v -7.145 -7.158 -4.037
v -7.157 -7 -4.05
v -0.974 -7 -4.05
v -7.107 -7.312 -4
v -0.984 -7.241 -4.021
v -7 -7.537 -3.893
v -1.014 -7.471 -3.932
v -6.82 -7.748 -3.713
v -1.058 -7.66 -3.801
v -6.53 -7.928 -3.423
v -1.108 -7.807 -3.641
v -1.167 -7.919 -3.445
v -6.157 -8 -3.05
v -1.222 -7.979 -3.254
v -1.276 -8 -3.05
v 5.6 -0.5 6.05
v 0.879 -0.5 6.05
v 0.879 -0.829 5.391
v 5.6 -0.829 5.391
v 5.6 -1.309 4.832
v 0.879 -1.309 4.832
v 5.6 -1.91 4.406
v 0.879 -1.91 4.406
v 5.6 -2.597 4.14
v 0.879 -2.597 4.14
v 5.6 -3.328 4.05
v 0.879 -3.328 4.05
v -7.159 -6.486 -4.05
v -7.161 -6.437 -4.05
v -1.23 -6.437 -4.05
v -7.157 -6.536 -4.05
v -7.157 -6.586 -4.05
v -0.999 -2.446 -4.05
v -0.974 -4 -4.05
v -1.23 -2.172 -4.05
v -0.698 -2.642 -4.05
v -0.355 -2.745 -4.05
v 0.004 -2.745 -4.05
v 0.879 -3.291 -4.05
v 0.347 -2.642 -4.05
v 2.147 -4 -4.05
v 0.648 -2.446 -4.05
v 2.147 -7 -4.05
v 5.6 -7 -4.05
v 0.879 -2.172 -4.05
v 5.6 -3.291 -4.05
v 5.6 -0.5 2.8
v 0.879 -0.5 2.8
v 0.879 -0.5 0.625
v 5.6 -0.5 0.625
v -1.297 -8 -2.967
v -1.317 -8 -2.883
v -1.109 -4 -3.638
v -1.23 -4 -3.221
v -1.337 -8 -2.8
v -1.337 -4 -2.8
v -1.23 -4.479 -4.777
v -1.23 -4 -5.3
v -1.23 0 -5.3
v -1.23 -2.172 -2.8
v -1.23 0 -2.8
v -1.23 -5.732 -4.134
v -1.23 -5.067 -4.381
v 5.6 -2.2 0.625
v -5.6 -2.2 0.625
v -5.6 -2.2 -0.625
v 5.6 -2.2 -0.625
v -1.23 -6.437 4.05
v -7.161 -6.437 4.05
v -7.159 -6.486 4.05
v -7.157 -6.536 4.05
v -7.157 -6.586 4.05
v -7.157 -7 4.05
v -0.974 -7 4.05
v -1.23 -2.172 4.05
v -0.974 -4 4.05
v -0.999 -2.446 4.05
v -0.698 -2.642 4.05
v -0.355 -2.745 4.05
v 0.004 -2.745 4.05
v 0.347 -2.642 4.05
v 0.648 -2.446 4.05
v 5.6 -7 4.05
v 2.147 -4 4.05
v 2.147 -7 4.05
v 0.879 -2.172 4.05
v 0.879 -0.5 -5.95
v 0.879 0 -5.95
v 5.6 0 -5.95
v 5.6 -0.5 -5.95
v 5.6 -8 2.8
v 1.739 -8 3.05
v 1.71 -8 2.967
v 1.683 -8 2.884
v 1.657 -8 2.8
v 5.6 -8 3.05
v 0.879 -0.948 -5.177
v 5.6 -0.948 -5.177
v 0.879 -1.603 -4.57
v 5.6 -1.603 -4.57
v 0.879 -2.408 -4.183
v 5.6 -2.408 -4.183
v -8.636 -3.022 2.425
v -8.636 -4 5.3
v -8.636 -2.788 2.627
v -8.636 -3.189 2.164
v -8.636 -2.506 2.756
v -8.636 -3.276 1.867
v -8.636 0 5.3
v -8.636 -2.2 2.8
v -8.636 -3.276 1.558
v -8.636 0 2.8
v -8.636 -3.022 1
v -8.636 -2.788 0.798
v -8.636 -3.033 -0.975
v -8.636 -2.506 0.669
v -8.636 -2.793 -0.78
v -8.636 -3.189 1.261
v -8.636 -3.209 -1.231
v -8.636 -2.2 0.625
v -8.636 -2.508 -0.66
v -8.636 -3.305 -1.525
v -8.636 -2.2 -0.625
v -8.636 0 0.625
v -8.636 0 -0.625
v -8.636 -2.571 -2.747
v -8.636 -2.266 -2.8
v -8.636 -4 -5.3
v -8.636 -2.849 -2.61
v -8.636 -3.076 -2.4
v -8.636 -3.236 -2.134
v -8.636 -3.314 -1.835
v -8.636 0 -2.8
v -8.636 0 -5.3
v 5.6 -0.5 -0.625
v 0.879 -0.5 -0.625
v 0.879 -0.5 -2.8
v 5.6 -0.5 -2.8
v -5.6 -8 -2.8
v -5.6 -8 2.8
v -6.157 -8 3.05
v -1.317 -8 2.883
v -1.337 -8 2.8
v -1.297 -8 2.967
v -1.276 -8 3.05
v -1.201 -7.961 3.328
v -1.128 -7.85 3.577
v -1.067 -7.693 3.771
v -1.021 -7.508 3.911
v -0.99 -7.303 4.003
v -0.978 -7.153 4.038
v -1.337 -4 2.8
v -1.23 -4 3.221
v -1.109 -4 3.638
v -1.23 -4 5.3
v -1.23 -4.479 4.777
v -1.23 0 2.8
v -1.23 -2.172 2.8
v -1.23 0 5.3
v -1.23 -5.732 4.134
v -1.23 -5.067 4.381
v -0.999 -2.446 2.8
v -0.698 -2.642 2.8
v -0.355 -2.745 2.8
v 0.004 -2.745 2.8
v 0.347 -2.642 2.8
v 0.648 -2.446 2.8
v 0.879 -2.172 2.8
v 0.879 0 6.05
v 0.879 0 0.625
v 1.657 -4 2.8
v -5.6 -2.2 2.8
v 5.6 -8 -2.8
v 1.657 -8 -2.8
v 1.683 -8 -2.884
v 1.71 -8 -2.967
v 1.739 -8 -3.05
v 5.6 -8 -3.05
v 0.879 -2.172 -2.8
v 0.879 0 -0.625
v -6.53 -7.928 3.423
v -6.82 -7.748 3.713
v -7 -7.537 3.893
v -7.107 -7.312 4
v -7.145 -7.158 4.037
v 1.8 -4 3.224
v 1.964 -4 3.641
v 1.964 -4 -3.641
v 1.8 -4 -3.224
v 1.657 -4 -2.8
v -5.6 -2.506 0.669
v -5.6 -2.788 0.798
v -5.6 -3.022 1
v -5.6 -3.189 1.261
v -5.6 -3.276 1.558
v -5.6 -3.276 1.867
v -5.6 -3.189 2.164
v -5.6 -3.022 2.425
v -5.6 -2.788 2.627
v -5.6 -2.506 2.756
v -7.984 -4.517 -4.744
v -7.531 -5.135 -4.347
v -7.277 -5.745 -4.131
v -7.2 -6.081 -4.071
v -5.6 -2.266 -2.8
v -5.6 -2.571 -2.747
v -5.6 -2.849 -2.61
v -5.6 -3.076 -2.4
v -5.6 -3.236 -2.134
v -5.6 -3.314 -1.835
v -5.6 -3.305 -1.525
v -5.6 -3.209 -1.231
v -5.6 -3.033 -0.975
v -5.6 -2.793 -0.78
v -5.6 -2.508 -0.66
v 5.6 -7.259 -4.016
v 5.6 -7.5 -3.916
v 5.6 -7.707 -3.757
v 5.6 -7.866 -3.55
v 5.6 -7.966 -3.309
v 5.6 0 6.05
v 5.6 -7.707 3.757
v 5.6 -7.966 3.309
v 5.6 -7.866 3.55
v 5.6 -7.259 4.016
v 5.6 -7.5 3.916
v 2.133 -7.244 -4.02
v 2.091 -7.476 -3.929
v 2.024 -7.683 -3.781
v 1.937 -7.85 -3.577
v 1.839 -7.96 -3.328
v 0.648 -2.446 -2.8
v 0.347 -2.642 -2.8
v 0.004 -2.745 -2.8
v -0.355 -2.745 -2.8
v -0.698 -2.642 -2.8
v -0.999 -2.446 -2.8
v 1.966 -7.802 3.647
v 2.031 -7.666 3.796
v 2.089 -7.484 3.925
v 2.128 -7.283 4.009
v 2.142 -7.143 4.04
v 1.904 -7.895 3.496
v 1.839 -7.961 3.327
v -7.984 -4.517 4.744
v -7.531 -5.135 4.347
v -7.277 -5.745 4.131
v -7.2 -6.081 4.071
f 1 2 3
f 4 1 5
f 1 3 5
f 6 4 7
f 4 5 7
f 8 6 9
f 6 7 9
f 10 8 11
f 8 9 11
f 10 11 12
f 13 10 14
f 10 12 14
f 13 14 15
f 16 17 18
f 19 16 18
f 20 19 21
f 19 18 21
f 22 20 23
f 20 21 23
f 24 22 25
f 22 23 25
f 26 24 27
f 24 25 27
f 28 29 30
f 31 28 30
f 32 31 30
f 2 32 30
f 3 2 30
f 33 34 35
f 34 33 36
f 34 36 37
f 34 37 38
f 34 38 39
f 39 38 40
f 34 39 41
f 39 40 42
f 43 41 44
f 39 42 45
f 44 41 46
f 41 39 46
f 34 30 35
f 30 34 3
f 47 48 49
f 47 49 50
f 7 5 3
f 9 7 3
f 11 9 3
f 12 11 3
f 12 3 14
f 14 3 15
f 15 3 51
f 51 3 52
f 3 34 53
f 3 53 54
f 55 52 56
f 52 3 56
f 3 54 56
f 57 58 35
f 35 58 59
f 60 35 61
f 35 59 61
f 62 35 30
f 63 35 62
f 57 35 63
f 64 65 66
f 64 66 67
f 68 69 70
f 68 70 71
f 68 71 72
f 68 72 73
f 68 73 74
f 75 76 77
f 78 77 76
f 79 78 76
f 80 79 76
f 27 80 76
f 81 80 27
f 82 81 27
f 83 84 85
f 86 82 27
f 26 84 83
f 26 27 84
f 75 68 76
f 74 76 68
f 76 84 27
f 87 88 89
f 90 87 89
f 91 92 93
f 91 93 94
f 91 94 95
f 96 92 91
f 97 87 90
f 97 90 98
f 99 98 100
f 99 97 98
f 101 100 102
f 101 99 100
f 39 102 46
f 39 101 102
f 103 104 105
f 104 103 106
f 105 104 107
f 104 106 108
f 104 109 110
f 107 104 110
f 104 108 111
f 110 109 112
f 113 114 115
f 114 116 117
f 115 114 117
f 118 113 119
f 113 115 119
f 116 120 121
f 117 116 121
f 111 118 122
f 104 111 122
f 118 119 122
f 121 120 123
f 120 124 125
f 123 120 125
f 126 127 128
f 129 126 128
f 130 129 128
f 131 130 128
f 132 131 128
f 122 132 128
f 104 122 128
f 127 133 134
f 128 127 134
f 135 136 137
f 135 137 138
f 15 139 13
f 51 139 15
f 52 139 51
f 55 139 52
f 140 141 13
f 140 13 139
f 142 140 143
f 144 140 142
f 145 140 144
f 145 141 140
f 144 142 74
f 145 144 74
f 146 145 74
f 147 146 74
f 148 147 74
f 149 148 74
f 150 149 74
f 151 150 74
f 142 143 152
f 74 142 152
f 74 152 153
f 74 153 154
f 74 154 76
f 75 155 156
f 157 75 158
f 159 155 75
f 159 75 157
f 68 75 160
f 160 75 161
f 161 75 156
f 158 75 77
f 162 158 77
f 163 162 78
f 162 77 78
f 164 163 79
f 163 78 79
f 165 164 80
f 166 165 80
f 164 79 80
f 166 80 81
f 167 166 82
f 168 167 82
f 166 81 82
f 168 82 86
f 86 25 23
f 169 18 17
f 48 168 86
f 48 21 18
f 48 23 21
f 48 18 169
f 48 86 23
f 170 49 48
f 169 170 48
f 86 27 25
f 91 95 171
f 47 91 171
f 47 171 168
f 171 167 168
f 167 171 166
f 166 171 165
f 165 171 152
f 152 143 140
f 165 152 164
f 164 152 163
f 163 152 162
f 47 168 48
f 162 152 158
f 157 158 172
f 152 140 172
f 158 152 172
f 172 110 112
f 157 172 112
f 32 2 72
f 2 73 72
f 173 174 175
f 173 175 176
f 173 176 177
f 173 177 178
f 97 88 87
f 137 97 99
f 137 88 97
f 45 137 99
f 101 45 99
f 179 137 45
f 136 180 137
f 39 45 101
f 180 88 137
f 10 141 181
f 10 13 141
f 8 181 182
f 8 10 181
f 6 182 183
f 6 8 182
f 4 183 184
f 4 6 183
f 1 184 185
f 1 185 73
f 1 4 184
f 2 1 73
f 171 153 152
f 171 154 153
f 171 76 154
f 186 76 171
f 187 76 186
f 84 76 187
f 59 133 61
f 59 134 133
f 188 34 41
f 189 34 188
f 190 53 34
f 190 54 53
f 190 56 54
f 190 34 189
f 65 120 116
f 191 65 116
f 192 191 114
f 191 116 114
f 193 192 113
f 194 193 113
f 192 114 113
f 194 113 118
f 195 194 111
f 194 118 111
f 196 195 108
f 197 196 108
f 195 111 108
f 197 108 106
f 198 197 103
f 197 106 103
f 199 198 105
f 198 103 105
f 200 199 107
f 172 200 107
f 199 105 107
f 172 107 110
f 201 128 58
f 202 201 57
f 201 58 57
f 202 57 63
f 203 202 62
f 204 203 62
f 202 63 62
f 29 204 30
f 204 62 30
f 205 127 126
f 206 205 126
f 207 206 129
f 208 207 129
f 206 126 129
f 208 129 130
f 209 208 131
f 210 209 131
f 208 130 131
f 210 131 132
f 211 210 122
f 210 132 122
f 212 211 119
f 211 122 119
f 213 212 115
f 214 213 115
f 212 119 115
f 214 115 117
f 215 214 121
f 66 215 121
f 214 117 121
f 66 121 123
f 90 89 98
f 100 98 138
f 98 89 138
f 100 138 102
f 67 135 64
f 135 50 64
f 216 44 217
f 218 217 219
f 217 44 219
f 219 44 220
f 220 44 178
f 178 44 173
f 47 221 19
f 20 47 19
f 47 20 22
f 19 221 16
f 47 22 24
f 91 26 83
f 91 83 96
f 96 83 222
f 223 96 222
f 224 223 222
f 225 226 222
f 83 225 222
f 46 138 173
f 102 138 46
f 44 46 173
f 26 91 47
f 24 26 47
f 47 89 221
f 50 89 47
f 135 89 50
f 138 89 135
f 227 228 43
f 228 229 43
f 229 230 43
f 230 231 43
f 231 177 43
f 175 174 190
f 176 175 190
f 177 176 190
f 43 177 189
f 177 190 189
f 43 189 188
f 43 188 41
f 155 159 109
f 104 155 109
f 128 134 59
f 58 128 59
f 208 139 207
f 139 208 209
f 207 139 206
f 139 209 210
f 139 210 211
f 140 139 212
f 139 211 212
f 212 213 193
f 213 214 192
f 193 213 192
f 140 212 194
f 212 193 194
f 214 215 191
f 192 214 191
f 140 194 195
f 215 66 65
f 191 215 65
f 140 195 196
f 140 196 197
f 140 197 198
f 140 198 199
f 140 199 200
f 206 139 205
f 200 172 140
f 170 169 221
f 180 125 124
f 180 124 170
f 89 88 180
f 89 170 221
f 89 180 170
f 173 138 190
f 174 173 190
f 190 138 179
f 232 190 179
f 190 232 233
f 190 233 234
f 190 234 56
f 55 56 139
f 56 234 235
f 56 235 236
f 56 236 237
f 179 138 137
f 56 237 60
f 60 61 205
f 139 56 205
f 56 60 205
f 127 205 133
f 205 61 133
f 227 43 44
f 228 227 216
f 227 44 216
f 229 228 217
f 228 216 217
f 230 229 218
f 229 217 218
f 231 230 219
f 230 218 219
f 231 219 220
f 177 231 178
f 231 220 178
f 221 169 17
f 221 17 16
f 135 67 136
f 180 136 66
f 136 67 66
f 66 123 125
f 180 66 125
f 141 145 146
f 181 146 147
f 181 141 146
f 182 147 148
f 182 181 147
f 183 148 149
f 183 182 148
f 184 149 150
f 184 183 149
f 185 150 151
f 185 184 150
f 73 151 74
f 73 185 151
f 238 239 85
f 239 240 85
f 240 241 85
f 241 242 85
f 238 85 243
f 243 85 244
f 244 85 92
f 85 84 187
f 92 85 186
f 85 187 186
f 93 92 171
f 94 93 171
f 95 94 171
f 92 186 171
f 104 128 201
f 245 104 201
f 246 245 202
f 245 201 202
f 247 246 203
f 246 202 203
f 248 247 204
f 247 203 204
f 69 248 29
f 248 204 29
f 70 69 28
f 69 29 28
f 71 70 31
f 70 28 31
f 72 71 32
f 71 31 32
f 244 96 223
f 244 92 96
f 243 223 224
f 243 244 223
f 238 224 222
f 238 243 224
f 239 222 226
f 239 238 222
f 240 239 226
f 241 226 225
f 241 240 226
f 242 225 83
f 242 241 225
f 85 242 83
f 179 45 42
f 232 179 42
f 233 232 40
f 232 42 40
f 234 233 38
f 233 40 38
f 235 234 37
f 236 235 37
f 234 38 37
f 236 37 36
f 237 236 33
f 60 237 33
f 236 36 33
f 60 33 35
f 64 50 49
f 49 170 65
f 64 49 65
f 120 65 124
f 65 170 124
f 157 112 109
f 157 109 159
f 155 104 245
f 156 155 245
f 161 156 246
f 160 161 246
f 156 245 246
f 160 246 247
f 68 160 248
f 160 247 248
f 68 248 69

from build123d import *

# Parameters (mm, degrees)
F1_DEPTH      = 2.2
F2_DEPTH      = 4
F3_DEPTH      = 8
F5_W          = 4.721
F5_H          = 0.5
F6_DEPTH      = 2
F6_DEPTH_BACK = 10
F7_DEPTH      = 4
F8_T1_DEPTH   = 5.9270831351
F8_T3_DEPTH   = 8.1
F8_T5_DEPTH   = 4.721
F8_T11_DEPTH  = 12.0188296006
F8_T16_DEPTH  = 14.5648341529
F8_T24_DEPTH  = 14.5648341529
F8_T29_DEPTH  = 12.0188296006
F10_DEPTH     = 1.5
F12_DEPTH     = 2
F13_R         = 1


# Not quite as in the source:
# - a fillet or chamfer that OpenCascade refuses, or shapes differently, is made with other operations: its cross-section is extruded or revolved along the edge and cut away or added


with BuildPart() as f1:
    # F0 (on Front) → F1 (new body)
    with BuildSketch(Plane.XZ):
        with BuildLine():
            Line((-1.6440981598, 0.625), (-5.6, 0.625))
            Line((-5.6, 0.625), (-5.6, -0.625))
            Line((-5.6, -0.625), (-1.6440981598, -0.625))
            ThreePointArc((-1.6440981598, -0.625), (-1.6599999508, 0), (-1.6440981598, 0.625))
        make_face()
        with BuildLine():
            Line((-1.23, 0.625), (-1.6440981598, 0.625))
            ThreePointArc((-1.6440981598, 0.625), (-1.6599999508, 0), (-1.6440981598, -0.625))
            Line((-1.6440981598, -0.625), (-1.23, -0.625))
            Line((-1.23, -0.625), (1.2508001143, -0.625))
            ThreePointArc((1.2508001143, -0.625), (1.23, 0), (1.2508001143, 0.625))
            Line((1.2508001143, 0.625), (-1.23, 0.625))
        make_face()
        with BuildLine():
            Line((1.6420518568, 0.625), (1.2508001143, 0.625))
            ThreePointArc((1.2508001143, 0.625), (1.23, 0), (1.2508001143, -0.625))
            Line((1.2508001143, -0.625), (1.6420518568, -0.625))
            Line((1.6420518568, -0.625), (5.6, -0.625))
            Line((5.6, -0.625), (5.6, 0.625))
            Line((5.6, 0.625), (1.6420518568, 0.625))
        make_face()
    extrude(amount=F1_DEPTH)

    # F0 (on Front) → F2 (join)
    with BuildSketch(Plane.XZ):
        with BuildLine():
            Line((5.6, -2.8), (1.6566885771, -2.8))
            ThreePointArc((1.6566885771, -2.8), (1.8795878526, -3.4337692421), (2.1471830551, -4.05))
            Line((2.1471830551, -4.05), (5.6, -4.05))
            Line((5.6, -4.05), (5.6, -2.8))
        make_face()
        with BuildLine():
            Line((-1.23, -2.8), (-1.3368015602, -2.8))
            ThreePointArc((-1.3368015602, -2.8), (-1.1717307029, -3.4298126738), (-0.9735386938, -4.05))
            Line((-0.9735386938, -4.05), (0.8789681604, -4.05))
            Line((0.8789681604, -4.05), (2.1471830551, -4.05))
            ThreePointArc((2.1471830551, -4.05), (1.8795878526, -3.4337692421), (1.6566885771, -2.8))
            Line((1.6566885771, -2.8), (1.23, -2.8))
            Line((1.23, -2.8), (-1.23, -2.8))
        make_face()
        with BuildLine():
            Line((-1.735931594, -2.8), (-5.6, -2.8))
            Line((-5.6, -2.8), (-5.6, -4.05))
            Line((-5.6, -4.05), (-2.3307385194, -4.05))
            Line((-2.3307385194, -4.05), (-1.23, -4.05))
            Line((-1.23, -4.05), (-0.9735386938, -4.05))
            ThreePointArc((-0.9735386938, -4.05), (-1.1717307029, -3.4298126738), (-1.3368015602, -2.8))
            Line((-1.3368015602, -2.8), (-1.735931594, -2.8))
        make_face()
        Polygon((-7.1570831351, 4.05), (-5.6, 4.05), (-2.3307385194, 4.05), (-1.23, 4.05), (-1.23, 5.3), (-8.636245504, 5.3), (-8.636245504, -5.3), (-1.23, -5.3), (-1.23, -4.05), (-2.3307385194, -4.05), (-5.6, -4.05), (-7.1570831351, -4.05), align=None)
        Polygon((-5.6, -0.625), (-5.6, 0.625), (-5.6, 2.8), (-5.6, 4.05), (-7.1570831351, 4.05), (-7.1570831351, -4.05), (-5.6, -4.05), (-5.6, -2.8), align=None)
        with BuildLine():
            Line((-5.6, 4.05), (-5.6, 2.8))
            Line((-5.6, 2.8), (-1.735931594, 2.8))
            Line((-1.735931594, 2.8), (-1.3368015602, 2.8))
            ThreePointArc((-1.3368015602, 2.8), (-1.1717307029, 3.4298126738), (-0.9735386938, 4.05))
            Line((-0.9735386938, 4.05), (-1.23, 4.05))
            Line((-1.23, 4.05), (-2.3307385194, 4.05))
            Line((-2.3307385194, 4.05), (-5.6, 4.05))
        make_face()
        with BuildLine():
            ThreePointArc((-0.9735386938, 4.05), (-1.1717307029, 3.4298126738), (-1.3368015602, 2.8))
            Line((-1.3368015602, 2.8), (1.23, 2.8))
            Line((1.23, 2.8), (1.2939187969, 2.8))
            Line((1.2939187969, 2.8), (1.6566885771, 2.8))
            ThreePointArc((1.6566885771, 2.8), (1.8795878526, 3.4337692421), (2.1471830551, 4.05))
            Line((2.1471830551, 4.05), (0.8789681604, 4.05))
            Line((0.8789681604, 4.05), (-0.9735386938, 4.05))
        make_face()
        with BuildLine():
            ThreePointArc((2.1471830551, 4.05), (1.8795878526, 3.4337692421), (1.6566885771, 2.8))
            Line((1.6566885771, 2.8), (5.6, 2.8))
            Line((5.6, 2.8), (5.6, 4.05))
            Line((5.6, 4.05), (2.1471830551, 4.05))
        make_face()
    extrude(amount=F2_DEPTH)

    # F0 (on Front) → F3 (join)
    with BuildSketch(Plane.XZ):
        with BuildLine():
            ThreePointArc((2.1471830551, 4.05), (1.8795878526, 3.4337692421), (1.6566885771, 2.8))
            Line((1.6566885771, 2.8), (5.6, 2.8))
            Line((5.6, 2.8), (5.6, 4.05))
            Line((5.6, 4.05), (2.1471830551, 4.05))
        make_face()
        with BuildLine():
            Line((-5.6, 4.05), (-5.6, 2.8))
            Line((-5.6, 2.8), (-1.735931594, 2.8))
            Line((-1.735931594, 2.8), (-1.3368015602, 2.8))
            ThreePointArc((-1.3368015602, 2.8), (-1.1717307029, 3.4298126738), (-0.9735386938, 4.05))
            Line((-0.9735386938, 4.05), (-1.23, 4.05))
            Line((-1.23, 4.05), (-2.3307385194, 4.05))
            Line((-2.3307385194, 4.05), (-5.6, 4.05))
        make_face()
        Polygon((-5.6, -0.625), (-5.6, 0.625), (-5.6, 2.8), (-5.6, 4.05), (-7.1570831351, 4.05), (-7.1570831351, -4.05), (-5.6, -4.05), (-5.6, -2.8), align=None)
        with BuildLine():
            Line((-1.735931594, -2.8), (-5.6, -2.8))
            Line((-5.6, -2.8), (-5.6, -4.05))
            Line((-5.6, -4.05), (-2.3307385194, -4.05))
            Line((-2.3307385194, -4.05), (-1.23, -4.05))
            Line((-1.23, -4.05), (-0.9735386938, -4.05))
            ThreePointArc((-0.9735386938, -4.05), (-1.1717307029, -3.4298126738), (-1.3368015602, -2.8))
            Line((-1.3368015602, -2.8), (-1.735931594, -2.8))
        make_face()
        with BuildLine():
            Line((5.6, -2.8), (1.6566885771, -2.8))
            ThreePointArc((1.6566885771, -2.8), (1.8795878526, -3.4337692421), (2.1471830551, -4.05))
            Line((2.1471830551, -4.05), (5.6, -4.05))
            Line((5.6, -4.05), (5.6, -2.8))
        make_face()
    extrude(amount=F3_DEPTH)

    # F5 (on face) → F6 (join, two sides)
    with BuildSketch(Plane.XY.offset(4.05)) as f6_sk:
        with Locations((3.2395, -0.25)):
            Rectangle(F5_W, F5_H)
    extrude(amount=F6_DEPTH)
    extrude(f6_sk.sketch, amount=-F6_DEPTH_BACK)

    # F4 (on face) → F7 (cut)
    with BuildSketch(Plane(origin=(-8.636245504, 0, 0), x_dir=(0, -1, 0), z_dir=(-1, 0, 0))):
        with BuildLine():
            ThreePointArc((2.2, 0.625), (3.2875, 1.7125), (2.2, 2.8))
            Line((2.2, 2.8), (0, 2.8))
            Line((0, 2.8), (0, 0.625))
            Line((0, 0.625), (2.2, 0.625))
        make_face()
        with BuildLine():
            ThreePointArc((2.2659621103, -2.8), (3.3204810552, -1.6795189448), (2.2, -0.625))
            Line((2.2, -0.625), (0, -0.625))
            Line((0, -0.625), (0, -2.8))
            Line((0, -2.8), (2.2, -2.8))
            Line((2.2, -2.8), (2.2659621103, -2.8))
        make_face()
    extrude(amount=-F7_DEPTH, mode=Mode.SUBTRACT)

    # F8: fillet of radius 3 on 5 edges, made by hand

    # F8_s2 → F8_t1 (join)
    with BuildSketch(Plane.YZ.offset(-7.1570831351)):
        with BuildLine():
            ThreePointArc((-4, 5.3), (-5.0673921924, 4.380730437), (-6.4366985862, 4.05))
            Line((-6.4366985862, 4.05), (-4, 4.05))
            Line((-4, 4.05), (-4, 5.3))
        make_face()
        with BuildLine():
            ThreePointArc((-4, -5.3), (-5.0673921924, -4.380730437), (-6.4366985862, -4.05))
            Line((-6.4366985862, -4.05), (-4, -4.05))
            Line((-4, -4.05), (-4, -5.3))
        make_face()
    extrude(amount=F8_T1_DEPTH)

    # F8_s4 → F8_t3 (join)
    with BuildSketch(Plane.XY.offset(-4.05)):
        with BuildLine():
            ThreePointArc((-8.636245504, -4), (-7.5529985653, -5.0963889141), (-7.1570831351, -6.5859336612))
            Line((-7.1570831351, -6.5859336612), (-7.1570831351, -4))
            Line((-7.1570831351, -4), (-8.636245504, -4))
        make_face()
    extrude(amount=F8_T3_DEPTH)

    # F8_s6 → F8_t5 (join)
    with BuildSketch(Plane.YZ.offset(0.879)):
        with BuildLine():
            ThreePointArc((-0.5, -5.95), (-1.6028628458, -4.5700806465), (-3.2910571474, -4.05))
            Line((-3.2910571474, -4.05), (-0.5, -4.05))
            Line((-0.5, -4.05), (-0.5, -5.95))
        make_face()
        with BuildLine():
            ThreePointArc((-0.5, 6.05), (-1.5963763172, 4.6005102572), (-3.3284271247, 4.05))
            Line((-3.3284271247, 4.05), (-0.5, 4.05))
            Line((-0.5, 4.05), (-0.5, 6.05))
        make_face()
    extrude(amount=F8_T5_DEPTH)


with BuildPart() as f8_tool9:
    # F8_s10 → F8_t11 (new body)
    with BuildSketch(Plane.YZ.offset(-13.2488296006)):
        with BuildLine():
            ThreePointArc((-4, 5.3), (-5.0673921924, 4.380730437), (-6.4366985862, 4.05))
            Line((-6.4366985862, 4.05), (-4, 4.05))
            Line((-4, 4.05), (-4, 5.3))
        make_face()
    extrude(amount=F8_T11_DEPTH)

    split(bisect_by=Plane.YZ.offset(-7.1570831351), keep=Keep.BOTTOM)

    split(bisect_by=Plane.YZ.offset(-8.636245504), keep=Keep.TOP)


with BuildPart() as f8_tool14:
    # F8_s15 → F8_t16 (new body)
    with BuildSketch(Plane.XY.offset(-4.05)):
        with BuildLine():
            ThreePointArc((-8.636245504, -4), (-7.5529985653, -5.0963889141), (-7.1570831351, -6.5859336612))
            Line((-7.1570831351, -6.5859336612), (-7.1570831351, -4))
            Line((-7.1570831351, -4), (-8.636245504, -4))
        make_face()
    extrude(amount=F8_T16_DEPTH)

    split(bisect_by=Plane.XY.offset(5.3), keep=Keep.BOTTOM)

    split(bisect_by=Plane.XY.offset(4.05), keep=Keep.TOP)


with BuildPart() as f8_tool9_1:
    add(f8_tool9.part)

    # F8_t19: intersect F8_tool14
    add(f8_tool14.part, mode=Mode.INTERSECT)


with BuildPart() as f1_1:
    add(f1.part)

    # F8_t7: union F8_tool9
    add(f8_tool9_1.part)


with BuildPart() as f8_tool22:
    # F8_s23 → F8_t24 (new body)
    with BuildSketch(Plane.XY.offset(-10.5148341529)):
        with BuildLine():
            ThreePointArc((-8.636245504, -4), (-7.5529985653, -5.0963889141), (-7.1570831351, -6.5859336612))
            Line((-7.1570831351, -6.5859336612), (-7.1570831351, -4))
            Line((-7.1570831351, -4), (-8.636245504, -4))
        make_face()
    extrude(amount=F8_T24_DEPTH)

    split(bisect_by=Plane.XY.offset(-5.3), keep=Keep.TOP)

    split(bisect_by=Plane.XY.offset(-4.05), keep=Keep.BOTTOM)


with BuildPart() as f8_tool27:
    # F8_s28 → F8_t29 (new body)
    with BuildSketch(Plane.YZ.offset(-1.23)):
        with BuildLine():
            ThreePointArc((-4, -5.3), (-5.0673921924, -4.380730437), (-6.4366985862, -4.05))
            Line((-6.4366985862, -4.05), (-4, -4.05))
            Line((-4, -4.05), (-4, -5.3))
        make_face()
    extrude(amount=-F8_T29_DEPTH)

    split(bisect_by=Plane.YZ.offset(-7.1570831351), keep=Keep.BOTTOM)

    split(bisect_by=Plane.YZ.offset(-8.636245504), keep=Keep.TOP)


with BuildPart() as f8_tool22_1:
    add(f8_tool22.part)

    # F8_t32: intersect F8_tool27
    add(f8_tool27.part, mode=Mode.INTERSECT)


with BuildPart() as f1_2:
    add(f1_1.part)

    # F8_t20: union F8_tool22
    add(f8_tool22_1.part)

    # F9 (on face) → F10 (cut)
    with BuildSketch(Plane.XY.offset(4.05)):
        with BuildLine():
            Line((-1.23, 0), (-1.23, -2.1719092038))
            ThreePointArc((-1.23, -2.1719092038), (-0.1755, -2.7577127774), (0.879, -2.1719092038))
            Line((0.879, -2.1719092038), (0.879, 0))
            Line((0.879, 0), (-1.23, 0))
        make_face()
    extrude(amount=-F10_DEPTH, mode=Mode.SUBTRACT)

    # F11 (on face) → F12 (cut)
    with BuildSketch(Plane(origin=(0, 0, -4.05), x_dir=(1, 0, 0), z_dir=(0, 0, -1))):
        with BuildLine():
            ThreePointArc((0.879, 2.1719092038), (-0.1755, 2.7577127774), (-1.23, 2.1719092038))
            Line((-1.23, 2.1719092038), (-1.23, 0))
            Line((-1.23, 0), (0.879, 0))
            Line((0.879, 0), (0.879, 0.5))
            Line((0.879, 0.5), (0.879, 2.1719092038))
        make_face()
    extrude(amount=-F12_DEPTH, mode=Mode.SUBTRACT)

    # F13
    f13_edges = [f1_2.edges().sort_by_distance(p)[0] for p in [
        (-4.065311, -8, 4.05),
        (-7.157083, -8, 0),
        (-4.065311, -8, -4.05),
        (3.873592, -8, -4.05),
        (3.873592, -8, 4.05),
    ]]
    fillet(f13_edges, radius=F13_R)


solid = f1_2.part
